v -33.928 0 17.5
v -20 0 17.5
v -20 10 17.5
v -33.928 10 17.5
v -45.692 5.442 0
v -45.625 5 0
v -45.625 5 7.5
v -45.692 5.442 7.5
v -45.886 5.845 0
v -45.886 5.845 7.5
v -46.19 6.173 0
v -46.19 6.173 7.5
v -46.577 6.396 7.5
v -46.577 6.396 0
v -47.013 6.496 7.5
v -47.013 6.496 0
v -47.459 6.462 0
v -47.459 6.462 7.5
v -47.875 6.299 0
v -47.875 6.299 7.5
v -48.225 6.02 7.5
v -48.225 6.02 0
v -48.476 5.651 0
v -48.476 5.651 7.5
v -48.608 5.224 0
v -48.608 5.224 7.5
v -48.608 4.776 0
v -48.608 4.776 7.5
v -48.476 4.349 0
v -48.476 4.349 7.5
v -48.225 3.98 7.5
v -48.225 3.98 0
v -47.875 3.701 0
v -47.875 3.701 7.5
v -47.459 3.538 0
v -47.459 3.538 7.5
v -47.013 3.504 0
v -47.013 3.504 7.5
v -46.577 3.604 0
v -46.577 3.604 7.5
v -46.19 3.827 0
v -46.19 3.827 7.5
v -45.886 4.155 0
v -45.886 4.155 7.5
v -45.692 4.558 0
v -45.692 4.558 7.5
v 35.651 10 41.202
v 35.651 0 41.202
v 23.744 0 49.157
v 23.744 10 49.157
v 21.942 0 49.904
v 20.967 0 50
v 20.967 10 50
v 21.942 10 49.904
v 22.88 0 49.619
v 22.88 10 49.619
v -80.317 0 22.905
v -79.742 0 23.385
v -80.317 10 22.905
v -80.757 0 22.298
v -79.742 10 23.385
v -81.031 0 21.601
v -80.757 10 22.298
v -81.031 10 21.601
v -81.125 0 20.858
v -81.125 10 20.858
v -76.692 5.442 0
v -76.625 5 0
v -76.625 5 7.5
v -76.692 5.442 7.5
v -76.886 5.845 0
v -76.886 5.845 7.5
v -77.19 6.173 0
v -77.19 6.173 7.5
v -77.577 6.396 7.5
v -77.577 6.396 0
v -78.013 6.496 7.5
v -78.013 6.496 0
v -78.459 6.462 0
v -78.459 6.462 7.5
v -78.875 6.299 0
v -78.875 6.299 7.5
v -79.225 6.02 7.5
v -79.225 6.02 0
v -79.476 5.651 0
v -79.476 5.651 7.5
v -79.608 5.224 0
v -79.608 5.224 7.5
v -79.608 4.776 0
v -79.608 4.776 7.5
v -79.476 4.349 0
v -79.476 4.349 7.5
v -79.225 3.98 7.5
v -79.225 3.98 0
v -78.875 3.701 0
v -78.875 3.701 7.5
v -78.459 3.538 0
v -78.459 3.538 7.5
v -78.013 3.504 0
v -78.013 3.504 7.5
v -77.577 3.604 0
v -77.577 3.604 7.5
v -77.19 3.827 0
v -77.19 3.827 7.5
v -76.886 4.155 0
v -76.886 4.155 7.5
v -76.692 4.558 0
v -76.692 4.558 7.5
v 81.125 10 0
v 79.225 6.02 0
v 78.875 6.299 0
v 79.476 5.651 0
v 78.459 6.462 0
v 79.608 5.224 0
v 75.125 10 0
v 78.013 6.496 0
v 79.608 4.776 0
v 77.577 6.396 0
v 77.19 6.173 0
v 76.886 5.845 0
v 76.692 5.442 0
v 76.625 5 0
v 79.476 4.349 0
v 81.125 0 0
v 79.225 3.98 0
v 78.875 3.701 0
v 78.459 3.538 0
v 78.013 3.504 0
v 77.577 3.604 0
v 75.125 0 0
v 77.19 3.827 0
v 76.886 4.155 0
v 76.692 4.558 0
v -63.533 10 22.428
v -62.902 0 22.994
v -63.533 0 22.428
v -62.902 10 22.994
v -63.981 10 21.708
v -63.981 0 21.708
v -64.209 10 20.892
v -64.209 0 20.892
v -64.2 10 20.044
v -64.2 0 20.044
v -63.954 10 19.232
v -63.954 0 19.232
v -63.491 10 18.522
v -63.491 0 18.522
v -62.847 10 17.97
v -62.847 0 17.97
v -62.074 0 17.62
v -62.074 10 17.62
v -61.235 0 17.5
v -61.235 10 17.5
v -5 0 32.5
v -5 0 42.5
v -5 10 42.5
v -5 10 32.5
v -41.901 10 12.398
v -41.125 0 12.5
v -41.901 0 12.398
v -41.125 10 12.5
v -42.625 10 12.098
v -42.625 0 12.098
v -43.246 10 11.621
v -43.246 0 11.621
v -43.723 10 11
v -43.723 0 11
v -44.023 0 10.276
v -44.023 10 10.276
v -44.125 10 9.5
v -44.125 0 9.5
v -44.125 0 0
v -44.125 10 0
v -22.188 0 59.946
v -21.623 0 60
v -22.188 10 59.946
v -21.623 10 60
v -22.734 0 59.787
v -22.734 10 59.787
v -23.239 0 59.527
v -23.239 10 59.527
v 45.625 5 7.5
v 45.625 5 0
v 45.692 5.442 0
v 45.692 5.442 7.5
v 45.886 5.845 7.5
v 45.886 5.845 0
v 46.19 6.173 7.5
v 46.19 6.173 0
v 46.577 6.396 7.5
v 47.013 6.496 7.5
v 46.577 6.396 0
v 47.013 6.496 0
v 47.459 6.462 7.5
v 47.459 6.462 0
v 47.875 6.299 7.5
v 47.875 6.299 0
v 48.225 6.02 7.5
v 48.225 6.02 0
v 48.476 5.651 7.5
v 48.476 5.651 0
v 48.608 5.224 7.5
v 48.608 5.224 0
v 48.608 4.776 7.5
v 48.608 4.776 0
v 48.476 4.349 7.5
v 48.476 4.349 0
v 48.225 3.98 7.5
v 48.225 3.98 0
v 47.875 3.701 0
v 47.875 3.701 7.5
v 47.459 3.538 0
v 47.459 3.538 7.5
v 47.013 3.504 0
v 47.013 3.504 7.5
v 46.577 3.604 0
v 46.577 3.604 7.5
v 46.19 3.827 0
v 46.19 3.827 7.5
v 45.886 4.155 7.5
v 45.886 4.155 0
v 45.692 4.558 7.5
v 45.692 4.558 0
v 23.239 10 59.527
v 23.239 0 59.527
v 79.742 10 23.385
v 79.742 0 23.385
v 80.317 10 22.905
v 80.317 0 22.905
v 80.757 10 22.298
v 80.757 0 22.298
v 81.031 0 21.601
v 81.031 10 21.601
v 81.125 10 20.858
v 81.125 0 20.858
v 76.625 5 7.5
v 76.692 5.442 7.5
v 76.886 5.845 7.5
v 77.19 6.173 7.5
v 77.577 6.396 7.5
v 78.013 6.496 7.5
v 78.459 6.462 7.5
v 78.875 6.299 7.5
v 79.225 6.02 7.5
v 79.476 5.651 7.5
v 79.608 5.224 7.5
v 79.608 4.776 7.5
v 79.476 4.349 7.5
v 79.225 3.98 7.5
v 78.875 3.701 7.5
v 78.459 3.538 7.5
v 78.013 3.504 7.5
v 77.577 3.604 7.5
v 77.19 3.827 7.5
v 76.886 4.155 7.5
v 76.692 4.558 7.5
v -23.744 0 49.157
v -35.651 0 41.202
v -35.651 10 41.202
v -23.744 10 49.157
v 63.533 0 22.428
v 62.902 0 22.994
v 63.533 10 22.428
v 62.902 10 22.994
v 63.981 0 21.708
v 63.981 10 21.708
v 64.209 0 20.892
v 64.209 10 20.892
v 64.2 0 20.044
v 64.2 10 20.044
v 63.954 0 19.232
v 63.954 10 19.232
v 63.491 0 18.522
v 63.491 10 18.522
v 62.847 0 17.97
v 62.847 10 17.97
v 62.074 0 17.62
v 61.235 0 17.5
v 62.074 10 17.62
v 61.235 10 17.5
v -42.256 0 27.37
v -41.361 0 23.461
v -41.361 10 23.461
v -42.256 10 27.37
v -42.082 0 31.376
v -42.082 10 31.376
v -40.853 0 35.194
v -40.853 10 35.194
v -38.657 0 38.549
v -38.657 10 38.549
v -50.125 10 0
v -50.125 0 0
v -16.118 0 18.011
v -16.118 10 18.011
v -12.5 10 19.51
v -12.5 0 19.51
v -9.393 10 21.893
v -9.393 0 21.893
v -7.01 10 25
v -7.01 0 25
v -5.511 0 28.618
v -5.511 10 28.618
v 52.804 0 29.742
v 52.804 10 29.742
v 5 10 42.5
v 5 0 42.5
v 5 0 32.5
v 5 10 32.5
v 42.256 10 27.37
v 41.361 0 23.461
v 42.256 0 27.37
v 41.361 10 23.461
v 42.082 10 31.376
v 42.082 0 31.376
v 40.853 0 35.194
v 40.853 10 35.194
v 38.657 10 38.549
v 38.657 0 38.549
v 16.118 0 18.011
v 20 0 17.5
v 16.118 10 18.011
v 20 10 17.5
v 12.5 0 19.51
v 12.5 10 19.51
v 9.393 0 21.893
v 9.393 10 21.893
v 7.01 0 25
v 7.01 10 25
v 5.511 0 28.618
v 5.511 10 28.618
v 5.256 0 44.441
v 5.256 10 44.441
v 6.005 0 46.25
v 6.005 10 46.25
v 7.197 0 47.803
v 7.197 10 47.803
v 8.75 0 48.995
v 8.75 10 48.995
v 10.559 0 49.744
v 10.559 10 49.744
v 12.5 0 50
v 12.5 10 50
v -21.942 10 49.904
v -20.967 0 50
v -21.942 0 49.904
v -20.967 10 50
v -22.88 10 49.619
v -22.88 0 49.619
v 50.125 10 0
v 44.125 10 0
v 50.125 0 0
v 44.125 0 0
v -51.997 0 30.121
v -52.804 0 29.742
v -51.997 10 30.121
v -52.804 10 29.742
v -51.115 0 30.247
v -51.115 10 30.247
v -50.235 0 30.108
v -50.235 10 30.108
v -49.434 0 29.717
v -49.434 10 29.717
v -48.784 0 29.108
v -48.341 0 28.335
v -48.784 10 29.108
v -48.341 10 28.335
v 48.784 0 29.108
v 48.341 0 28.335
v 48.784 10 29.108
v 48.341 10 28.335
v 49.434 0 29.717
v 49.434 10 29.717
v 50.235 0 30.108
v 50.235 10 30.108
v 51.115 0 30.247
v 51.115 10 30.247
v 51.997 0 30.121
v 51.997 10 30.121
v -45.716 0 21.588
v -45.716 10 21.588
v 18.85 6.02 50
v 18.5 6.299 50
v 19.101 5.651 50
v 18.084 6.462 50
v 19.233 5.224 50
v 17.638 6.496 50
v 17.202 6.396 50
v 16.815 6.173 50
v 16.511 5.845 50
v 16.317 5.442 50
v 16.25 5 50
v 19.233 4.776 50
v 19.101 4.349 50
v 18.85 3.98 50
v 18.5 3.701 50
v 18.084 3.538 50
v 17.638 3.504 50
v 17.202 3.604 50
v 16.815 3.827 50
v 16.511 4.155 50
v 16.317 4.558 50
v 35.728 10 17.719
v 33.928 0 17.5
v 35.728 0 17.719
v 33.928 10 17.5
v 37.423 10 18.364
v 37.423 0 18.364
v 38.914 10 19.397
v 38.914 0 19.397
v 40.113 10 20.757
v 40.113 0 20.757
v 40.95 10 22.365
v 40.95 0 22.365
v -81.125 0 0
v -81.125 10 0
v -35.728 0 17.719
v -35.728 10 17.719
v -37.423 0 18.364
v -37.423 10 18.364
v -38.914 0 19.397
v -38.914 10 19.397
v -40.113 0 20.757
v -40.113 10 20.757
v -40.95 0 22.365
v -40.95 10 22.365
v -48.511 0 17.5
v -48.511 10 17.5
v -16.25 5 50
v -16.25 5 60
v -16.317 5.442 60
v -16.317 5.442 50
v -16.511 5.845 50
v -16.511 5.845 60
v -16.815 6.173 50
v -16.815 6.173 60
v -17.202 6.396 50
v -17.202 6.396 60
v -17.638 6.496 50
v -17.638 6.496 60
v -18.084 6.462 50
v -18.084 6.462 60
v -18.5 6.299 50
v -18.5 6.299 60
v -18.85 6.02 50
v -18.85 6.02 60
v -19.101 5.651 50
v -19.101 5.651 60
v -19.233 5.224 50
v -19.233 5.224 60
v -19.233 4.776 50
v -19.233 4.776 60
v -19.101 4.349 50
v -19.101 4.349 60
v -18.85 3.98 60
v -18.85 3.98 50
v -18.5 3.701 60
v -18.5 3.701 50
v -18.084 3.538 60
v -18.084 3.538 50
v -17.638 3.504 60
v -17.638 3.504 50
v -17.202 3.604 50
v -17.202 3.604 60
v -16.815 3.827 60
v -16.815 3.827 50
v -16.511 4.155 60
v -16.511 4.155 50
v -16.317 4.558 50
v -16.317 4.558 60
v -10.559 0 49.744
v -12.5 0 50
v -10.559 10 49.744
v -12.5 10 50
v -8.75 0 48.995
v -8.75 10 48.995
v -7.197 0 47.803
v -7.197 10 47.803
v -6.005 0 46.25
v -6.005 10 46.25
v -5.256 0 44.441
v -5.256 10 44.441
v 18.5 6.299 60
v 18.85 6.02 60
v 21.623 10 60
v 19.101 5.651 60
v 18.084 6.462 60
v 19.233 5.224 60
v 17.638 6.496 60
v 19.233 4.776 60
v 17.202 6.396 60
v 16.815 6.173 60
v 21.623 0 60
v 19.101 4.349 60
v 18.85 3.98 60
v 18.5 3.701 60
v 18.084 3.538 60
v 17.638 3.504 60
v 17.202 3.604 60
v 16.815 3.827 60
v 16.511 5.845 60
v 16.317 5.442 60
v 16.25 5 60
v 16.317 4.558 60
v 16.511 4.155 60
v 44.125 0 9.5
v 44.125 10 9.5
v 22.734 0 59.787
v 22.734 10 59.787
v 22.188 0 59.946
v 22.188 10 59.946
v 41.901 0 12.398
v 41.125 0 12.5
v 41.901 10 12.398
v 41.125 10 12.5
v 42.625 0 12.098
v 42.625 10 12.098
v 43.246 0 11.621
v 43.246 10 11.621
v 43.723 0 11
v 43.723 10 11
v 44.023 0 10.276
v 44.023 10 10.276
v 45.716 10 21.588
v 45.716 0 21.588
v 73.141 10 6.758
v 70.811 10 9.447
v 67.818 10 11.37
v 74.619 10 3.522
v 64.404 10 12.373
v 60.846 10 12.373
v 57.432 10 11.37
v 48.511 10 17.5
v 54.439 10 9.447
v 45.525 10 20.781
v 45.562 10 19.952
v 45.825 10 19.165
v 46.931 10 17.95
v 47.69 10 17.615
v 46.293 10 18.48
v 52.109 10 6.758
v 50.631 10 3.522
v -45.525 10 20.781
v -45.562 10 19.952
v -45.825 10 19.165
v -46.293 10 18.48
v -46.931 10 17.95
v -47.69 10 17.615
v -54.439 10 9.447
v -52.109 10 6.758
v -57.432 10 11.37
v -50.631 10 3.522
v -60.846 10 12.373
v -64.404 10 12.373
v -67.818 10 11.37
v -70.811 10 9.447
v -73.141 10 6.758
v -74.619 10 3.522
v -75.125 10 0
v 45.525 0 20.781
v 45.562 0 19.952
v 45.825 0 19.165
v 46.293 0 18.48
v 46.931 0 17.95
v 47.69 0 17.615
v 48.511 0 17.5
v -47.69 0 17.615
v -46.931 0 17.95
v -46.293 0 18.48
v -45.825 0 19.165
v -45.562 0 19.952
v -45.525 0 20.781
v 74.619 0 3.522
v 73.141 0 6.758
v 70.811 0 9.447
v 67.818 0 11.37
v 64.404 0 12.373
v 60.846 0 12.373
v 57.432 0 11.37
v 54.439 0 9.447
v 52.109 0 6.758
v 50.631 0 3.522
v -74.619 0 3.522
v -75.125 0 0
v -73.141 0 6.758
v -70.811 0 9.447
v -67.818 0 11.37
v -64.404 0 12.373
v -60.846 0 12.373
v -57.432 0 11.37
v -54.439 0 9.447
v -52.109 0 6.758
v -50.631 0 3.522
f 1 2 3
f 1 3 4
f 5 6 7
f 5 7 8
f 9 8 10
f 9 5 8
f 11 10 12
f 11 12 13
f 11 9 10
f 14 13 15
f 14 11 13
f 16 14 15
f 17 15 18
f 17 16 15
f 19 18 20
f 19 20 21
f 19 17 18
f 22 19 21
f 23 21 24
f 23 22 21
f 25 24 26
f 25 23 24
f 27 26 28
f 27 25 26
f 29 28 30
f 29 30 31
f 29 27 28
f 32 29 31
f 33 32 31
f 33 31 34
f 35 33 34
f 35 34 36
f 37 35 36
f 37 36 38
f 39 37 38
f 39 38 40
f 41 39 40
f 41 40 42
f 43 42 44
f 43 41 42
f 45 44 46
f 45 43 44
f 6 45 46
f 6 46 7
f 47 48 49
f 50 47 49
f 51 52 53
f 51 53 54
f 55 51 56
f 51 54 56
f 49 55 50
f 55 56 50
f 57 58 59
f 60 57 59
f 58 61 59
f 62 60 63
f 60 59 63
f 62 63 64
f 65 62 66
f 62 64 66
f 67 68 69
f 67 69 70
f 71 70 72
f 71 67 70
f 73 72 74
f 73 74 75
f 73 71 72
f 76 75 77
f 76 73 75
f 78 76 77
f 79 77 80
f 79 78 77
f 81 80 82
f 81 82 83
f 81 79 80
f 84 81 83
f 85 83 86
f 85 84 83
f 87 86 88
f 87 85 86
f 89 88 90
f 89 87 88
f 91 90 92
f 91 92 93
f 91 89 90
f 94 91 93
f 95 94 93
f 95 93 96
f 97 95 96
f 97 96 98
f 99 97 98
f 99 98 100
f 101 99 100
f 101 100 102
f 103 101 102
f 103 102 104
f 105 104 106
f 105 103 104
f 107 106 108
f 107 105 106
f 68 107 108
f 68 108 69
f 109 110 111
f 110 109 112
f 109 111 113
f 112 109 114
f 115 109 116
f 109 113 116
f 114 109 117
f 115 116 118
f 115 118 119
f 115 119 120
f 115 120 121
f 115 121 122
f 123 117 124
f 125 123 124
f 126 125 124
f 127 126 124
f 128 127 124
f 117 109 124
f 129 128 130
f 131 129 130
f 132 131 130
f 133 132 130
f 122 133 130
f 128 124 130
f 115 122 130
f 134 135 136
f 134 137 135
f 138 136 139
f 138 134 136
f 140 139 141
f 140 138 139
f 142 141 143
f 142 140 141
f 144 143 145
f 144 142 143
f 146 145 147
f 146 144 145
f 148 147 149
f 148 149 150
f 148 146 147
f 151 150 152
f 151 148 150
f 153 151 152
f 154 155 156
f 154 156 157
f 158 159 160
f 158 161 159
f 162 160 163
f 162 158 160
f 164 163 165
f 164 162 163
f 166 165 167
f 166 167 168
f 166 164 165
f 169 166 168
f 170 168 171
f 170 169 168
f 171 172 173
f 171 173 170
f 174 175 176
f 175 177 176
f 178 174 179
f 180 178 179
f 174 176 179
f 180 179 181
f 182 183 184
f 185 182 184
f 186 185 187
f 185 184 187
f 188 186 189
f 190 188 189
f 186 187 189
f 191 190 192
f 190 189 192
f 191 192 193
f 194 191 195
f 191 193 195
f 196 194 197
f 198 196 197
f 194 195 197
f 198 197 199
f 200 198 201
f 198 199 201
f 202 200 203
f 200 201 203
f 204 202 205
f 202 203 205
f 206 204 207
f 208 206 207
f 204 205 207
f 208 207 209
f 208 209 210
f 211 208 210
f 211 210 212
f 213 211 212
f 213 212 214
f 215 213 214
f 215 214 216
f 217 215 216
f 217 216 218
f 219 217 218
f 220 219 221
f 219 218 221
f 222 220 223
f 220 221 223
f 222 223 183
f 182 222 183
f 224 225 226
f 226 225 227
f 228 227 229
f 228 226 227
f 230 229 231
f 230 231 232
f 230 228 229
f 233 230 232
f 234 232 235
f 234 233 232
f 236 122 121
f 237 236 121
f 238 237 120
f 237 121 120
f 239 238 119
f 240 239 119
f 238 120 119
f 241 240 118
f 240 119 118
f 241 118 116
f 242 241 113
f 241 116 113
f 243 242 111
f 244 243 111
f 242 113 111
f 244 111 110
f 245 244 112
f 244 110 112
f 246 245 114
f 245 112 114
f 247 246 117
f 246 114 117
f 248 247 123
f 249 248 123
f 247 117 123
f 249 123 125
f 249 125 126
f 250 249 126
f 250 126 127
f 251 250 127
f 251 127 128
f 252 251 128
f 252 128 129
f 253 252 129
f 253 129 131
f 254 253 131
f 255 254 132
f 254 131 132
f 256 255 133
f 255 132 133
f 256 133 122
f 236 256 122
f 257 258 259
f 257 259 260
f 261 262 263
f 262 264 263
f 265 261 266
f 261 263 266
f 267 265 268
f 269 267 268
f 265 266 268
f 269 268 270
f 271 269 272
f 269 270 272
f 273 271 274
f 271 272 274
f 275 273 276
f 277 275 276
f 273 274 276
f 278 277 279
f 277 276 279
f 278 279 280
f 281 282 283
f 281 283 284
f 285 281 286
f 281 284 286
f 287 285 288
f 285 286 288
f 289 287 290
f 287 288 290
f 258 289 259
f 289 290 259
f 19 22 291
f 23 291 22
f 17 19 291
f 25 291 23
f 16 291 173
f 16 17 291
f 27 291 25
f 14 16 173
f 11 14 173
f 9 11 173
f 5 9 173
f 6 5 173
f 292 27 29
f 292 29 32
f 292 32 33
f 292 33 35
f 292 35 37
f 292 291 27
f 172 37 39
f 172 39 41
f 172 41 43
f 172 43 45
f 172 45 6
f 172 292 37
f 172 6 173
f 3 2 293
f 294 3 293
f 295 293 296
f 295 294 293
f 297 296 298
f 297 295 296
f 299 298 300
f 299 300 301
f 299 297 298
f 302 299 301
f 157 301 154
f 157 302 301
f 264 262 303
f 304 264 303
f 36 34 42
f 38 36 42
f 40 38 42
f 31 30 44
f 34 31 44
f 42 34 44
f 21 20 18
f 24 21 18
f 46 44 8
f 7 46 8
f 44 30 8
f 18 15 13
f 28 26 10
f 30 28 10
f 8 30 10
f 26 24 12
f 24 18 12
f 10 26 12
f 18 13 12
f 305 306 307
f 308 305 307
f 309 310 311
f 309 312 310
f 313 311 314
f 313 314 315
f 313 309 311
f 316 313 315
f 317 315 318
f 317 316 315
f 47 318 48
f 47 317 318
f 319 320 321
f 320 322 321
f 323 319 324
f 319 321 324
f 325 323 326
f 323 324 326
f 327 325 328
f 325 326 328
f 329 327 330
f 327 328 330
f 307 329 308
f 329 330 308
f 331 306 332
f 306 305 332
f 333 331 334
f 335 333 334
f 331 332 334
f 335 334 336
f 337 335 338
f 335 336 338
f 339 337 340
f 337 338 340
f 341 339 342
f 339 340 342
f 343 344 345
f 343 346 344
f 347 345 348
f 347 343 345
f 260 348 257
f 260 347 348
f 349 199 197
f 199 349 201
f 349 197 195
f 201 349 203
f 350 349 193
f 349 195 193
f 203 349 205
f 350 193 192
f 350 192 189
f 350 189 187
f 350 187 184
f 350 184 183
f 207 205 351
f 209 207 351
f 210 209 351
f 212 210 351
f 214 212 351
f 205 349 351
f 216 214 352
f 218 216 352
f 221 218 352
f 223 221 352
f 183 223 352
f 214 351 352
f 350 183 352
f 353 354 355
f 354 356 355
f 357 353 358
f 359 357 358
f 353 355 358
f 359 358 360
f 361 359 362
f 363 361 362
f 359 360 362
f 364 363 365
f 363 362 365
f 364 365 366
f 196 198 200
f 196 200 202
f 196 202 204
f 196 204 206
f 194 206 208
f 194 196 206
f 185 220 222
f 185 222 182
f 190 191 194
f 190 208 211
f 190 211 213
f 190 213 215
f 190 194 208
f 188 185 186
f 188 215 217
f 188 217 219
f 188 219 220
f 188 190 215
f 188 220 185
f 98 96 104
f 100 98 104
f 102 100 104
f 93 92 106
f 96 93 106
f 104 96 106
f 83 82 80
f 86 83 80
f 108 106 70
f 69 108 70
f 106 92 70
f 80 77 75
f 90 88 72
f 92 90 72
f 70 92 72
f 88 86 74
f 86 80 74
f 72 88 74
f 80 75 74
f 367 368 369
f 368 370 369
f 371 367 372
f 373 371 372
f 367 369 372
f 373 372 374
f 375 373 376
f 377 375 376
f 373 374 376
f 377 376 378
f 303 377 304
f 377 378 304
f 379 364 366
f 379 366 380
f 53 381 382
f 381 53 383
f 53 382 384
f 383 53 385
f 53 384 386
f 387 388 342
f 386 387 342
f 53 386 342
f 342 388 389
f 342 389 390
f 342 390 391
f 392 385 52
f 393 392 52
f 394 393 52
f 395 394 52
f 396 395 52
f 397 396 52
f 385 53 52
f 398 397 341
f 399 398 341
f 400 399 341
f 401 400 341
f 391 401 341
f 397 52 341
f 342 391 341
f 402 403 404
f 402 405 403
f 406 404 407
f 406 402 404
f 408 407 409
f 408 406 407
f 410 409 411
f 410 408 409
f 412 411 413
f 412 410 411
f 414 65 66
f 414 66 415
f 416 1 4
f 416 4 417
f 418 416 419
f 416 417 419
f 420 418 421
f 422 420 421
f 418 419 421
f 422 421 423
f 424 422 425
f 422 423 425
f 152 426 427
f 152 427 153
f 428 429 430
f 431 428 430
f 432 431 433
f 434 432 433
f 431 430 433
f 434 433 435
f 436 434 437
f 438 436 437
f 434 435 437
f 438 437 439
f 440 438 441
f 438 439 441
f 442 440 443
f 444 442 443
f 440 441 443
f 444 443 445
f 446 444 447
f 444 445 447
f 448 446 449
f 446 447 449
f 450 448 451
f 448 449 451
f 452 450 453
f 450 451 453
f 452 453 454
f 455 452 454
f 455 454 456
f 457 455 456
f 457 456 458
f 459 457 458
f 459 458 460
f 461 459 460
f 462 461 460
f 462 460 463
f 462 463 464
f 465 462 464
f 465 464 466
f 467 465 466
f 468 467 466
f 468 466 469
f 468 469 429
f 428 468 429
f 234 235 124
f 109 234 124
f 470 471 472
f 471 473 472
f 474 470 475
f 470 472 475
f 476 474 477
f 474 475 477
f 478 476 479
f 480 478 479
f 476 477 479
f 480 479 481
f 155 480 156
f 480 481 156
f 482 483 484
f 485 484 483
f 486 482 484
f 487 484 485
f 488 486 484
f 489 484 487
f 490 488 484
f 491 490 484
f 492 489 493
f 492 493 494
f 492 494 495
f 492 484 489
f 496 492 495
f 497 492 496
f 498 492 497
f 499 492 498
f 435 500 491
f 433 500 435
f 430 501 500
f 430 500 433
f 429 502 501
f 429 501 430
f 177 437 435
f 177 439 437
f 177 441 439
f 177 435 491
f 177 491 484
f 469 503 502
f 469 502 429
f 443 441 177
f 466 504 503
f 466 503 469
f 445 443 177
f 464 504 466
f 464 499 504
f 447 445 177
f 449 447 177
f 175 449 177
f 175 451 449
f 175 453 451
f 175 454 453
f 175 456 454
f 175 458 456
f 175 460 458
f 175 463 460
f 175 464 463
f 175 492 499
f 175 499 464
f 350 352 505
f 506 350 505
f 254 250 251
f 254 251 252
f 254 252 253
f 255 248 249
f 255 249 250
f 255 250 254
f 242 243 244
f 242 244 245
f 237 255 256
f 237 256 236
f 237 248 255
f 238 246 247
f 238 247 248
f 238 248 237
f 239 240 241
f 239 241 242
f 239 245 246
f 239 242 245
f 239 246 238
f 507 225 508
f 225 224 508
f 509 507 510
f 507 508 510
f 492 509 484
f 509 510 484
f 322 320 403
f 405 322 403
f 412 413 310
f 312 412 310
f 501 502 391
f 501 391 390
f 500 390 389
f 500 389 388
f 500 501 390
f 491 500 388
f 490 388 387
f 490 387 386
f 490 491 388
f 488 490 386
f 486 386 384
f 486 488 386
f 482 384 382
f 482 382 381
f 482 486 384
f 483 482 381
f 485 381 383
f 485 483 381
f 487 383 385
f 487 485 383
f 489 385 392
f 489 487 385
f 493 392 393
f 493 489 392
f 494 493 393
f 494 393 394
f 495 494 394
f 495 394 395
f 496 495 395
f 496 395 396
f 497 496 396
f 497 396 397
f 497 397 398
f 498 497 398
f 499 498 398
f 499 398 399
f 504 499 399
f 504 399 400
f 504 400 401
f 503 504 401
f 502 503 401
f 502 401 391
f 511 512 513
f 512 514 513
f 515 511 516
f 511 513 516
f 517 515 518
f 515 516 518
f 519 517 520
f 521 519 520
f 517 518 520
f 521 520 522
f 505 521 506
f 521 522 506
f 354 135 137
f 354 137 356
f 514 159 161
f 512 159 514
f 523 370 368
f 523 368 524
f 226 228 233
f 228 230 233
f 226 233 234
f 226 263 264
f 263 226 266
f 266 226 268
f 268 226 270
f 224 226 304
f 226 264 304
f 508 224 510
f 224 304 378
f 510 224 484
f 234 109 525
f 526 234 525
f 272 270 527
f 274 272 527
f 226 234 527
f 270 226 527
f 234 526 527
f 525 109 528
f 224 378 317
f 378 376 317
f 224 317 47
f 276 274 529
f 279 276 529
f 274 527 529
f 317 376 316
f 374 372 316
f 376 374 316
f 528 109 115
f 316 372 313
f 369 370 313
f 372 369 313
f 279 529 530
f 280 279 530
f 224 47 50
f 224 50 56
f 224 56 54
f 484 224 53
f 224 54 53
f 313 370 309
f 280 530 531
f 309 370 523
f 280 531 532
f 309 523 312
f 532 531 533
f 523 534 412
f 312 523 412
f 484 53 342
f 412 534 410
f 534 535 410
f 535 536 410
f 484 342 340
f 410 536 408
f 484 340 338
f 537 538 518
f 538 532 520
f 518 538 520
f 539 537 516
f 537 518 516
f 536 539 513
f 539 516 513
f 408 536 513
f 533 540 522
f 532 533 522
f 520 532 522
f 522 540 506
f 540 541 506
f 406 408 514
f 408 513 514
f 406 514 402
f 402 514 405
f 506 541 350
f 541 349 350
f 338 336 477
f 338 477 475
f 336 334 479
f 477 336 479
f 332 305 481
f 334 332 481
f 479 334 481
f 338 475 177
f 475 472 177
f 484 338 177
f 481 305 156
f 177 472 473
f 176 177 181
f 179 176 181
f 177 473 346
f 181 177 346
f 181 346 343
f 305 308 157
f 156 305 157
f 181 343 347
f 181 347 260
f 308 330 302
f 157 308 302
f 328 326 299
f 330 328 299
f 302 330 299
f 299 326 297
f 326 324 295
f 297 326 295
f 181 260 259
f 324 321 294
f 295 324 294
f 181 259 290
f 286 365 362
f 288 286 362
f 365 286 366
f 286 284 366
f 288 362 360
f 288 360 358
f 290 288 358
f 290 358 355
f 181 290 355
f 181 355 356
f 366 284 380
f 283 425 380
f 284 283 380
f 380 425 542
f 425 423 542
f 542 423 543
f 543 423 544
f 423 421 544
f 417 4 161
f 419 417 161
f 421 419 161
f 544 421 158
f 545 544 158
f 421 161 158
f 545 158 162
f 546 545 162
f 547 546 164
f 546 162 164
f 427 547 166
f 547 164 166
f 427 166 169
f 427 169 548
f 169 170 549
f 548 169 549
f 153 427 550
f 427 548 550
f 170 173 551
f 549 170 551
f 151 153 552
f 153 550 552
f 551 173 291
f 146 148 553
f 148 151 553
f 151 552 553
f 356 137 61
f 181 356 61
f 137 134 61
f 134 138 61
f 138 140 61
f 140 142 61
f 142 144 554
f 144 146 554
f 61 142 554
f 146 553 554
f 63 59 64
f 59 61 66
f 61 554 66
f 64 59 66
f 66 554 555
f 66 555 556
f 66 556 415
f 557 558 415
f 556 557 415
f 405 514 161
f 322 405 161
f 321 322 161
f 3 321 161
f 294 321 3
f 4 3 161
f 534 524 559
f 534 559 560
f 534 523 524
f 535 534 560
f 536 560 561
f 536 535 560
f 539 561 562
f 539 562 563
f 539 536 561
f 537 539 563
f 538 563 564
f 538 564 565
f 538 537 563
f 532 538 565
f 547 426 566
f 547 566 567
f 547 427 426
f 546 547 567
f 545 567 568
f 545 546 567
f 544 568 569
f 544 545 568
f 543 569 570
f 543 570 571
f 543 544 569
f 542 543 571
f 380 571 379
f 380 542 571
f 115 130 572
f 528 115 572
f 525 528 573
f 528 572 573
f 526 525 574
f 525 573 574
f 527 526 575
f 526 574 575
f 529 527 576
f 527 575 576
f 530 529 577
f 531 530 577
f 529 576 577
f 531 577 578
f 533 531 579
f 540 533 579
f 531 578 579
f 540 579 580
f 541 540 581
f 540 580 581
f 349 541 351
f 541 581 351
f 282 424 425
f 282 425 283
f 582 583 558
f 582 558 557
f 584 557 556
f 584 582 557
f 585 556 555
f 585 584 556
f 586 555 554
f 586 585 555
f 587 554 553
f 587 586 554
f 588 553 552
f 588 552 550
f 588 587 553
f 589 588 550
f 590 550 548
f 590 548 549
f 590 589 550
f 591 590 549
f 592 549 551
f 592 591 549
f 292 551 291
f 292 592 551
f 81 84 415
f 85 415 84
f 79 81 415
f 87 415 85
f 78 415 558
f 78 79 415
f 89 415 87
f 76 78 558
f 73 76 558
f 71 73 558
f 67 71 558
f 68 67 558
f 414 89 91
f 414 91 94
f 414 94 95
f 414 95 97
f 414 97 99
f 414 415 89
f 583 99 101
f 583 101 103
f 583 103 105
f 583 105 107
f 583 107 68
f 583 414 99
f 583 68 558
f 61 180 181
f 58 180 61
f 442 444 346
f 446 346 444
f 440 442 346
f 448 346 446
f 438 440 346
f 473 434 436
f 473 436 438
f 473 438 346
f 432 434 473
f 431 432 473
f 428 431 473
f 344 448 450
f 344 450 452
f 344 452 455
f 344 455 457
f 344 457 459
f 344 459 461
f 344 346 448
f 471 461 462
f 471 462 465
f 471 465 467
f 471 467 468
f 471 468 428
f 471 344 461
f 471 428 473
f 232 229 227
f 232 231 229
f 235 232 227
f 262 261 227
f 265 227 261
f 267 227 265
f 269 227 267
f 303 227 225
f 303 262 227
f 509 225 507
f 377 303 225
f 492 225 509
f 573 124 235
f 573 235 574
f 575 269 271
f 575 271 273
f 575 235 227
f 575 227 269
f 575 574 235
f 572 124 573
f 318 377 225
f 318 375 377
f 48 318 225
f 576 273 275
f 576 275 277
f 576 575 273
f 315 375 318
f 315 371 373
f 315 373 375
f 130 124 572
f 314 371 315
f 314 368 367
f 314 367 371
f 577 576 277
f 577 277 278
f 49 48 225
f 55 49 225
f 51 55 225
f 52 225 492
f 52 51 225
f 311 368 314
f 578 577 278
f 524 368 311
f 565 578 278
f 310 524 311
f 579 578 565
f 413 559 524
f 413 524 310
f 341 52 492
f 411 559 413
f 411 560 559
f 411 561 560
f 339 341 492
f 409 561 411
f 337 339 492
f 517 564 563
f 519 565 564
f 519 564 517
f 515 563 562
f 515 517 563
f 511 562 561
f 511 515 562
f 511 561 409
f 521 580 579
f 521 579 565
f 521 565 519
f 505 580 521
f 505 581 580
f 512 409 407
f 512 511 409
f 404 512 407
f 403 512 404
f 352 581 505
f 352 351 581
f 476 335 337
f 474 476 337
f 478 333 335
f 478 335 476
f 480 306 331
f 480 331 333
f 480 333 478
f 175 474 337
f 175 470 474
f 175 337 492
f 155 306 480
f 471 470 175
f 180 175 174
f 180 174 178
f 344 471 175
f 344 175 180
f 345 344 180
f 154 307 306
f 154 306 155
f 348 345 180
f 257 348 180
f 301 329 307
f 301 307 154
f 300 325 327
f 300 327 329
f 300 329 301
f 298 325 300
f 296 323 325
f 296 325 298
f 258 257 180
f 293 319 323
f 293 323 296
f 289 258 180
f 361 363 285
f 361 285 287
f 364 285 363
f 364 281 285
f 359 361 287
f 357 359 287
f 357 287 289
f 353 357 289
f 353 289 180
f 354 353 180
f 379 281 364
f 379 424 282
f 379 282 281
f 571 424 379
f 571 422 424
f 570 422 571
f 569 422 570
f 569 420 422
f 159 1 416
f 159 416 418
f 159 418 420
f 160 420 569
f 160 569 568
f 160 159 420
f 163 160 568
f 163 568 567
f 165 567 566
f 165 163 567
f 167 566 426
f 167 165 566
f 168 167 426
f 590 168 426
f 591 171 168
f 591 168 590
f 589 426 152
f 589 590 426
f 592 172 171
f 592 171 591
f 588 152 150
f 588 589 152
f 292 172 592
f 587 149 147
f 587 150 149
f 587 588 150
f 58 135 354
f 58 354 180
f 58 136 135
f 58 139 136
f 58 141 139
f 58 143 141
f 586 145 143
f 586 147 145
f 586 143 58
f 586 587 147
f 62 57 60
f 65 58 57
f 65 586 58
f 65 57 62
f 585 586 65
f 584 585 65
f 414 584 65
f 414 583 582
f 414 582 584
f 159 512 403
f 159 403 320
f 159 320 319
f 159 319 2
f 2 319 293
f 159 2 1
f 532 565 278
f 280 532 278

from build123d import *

# Parameters (mm, degrees)
BOSS_EXTRUDE1_DEPTH = 10
CUT_EXTRUDE5_REACH  = 103.397
SKETCH9_R           = 1.5
FILLET10_R          = 3
FILLET11_R          = 3
FILLET12_R          = 3
FILLET13_R          = 7.5
FILLET14_R          = 15
FILLET16_R          = 15
FILLET18_R          = 15
FILLET19_R          = 7.5
FILLET22_R          = 3
FILLET23_R          = 3
FILLET24_R          = 15
FILLET25_R          = 3
FILLET26_R          = 3
FILLET27_R          = 3
FILLET28_R          = 3
FILLET29_R          = 3
FILLET30_R          = 3
FILLET31_R          = 3
SKETCH11_R          = 1.5
CUT_EXTRUDE6_DEPTH  = 7.5
FILLET32_R          = 7.5
FILLET33_R          = 5
FILLET34_R          = 7.5
FILLET36_R          = 5


with BuildPart() as part:
    # Sketch1 → Boss-Extrude1 (new body)
    with BuildSketch(Plane(origin=(0, 0, 0), x_dir=(1, 0, 0), z_dir=(0, 1, 0))):
        with BuildLine():
            Line((0, -12.5), (0, -60))
            Line((0, -60), (22.5, -60))
            Line((22.5, -60), (81.125, -22.5))
            Line((81.125, -22.5), (81.125, 0))
            Line((81.125, 0), (75.125, 0))
            ThreePointArc((75.125, 0), (62.625, -12.5), (50.125, 0))
            Line((50.125, 0), (44.125, 0))
            Line((44.125, 0), (44.125, -12.5))
            Line((44.125, -12.5), (0, -12.5))
        make_face()
        Polygon((39.125, -17.5), (45.538841531, -34.595428821), (22.483333333, -50), (5, -50), (5, -17.5), align=None, mode=Mode.SUBTRACT)
        Polygon((71.125, -17.5), (49.69624181, -31.817655806), (44.125, -17.5), align=None, mode=Mode.SUBTRACT)
    boss_extrude1 = extrude(amount=BOSS_EXTRUDE1_DEPTH)

    # Mirror1: Boss-Extrude1 across plane
    add(boss_extrude1.mirror(Plane(origin=(0, 10, 0), x_dir=(0, 0, 1), z_dir=(-1, 0, 0))))

    # Sketch9 → Cut-Extrude5 (cut, up to next)
    with BuildSketch(Plane.XY.offset(60), mode=Mode.PRIVATE) as cut_extrude5_sk1:
        with Locations((-17.75, 5)):
            Circle(SKETCH9_R)
    cut_extrude5_tool1 = extrude(cut_extrude5_sk1.sketch, amount=-CUT_EXTRUDE5_REACH, mode=Mode.PRIVATE) & part.part
    cut_extrude5 = cut_extrude5_tool1.solids().sort_by_distance((-17.75, 5, 60))[0]
    add(cut_extrude5, mode=Mode.SUBTRACT)

    # Mirror2: Cut-Extrude5 across plane
    add(cut_extrude5.mirror(Plane(origin=(0, 0, 0), x_dir=(0, 0, 1), z_dir=(1, 0, 0))), mode=Mode.SUBTRACT)

    # Fillet10
    fillet10_edges = [part.edges().sort_by_distance(p)[0] for p in [
        (71.125, 5, 17.5),
    ]]
    fillet(fillet10_edges, radius=FILLET10_R)

    # Fillet11
    fillet11_edges = [part.edges().sort_by_distance(p)[0] for p in [
        (44.125, 5, 17.5),
    ]]
    fillet(fillet11_edges, radius=FILLET11_R)

    # Fillet12
    fillet12_edges = [part.edges().sort_by_distance(p)[0] for p in [
        (49.69624181, 5, 31.817655806),
    ]]
    fillet(fillet12_edges, radius=FILLET12_R)

    # Fillet13
    fillet13_edges = [part.edges().sort_by_distance(p)[0] for p in [
        (39.125, 5, 17.5),
    ]]
    fillet(fillet13_edges, radius=FILLET13_R)

    # Fillet14
    fillet14_edges = [part.edges().sort_by_distance(p)[0] for p in [
        (45.538841531, 5, 34.595428821),
    ]]
    fillet(fillet14_edges, radius=FILLET14_R)

    # Fillet16
    fillet16_edges = [part.edges().sort_by_distance(p)[0] for p in [
        (5, 5, 17.5),
    ]]
    fillet(fillet16_edges, radius=FILLET16_R)

    # Fillet18
    fillet18_edges = [part.edges().sort_by_distance(p)[0] for p in [
        (-5, 5, 17.5),
    ]]
    fillet(fillet18_edges, radius=FILLET18_R)

    # Fillet19
    fillet19_edges = [part.edges().sort_by_distance(p)[0] for p in [
        (-39.125, 5, 17.5),
    ]]
    fillet(fillet19_edges, radius=FILLET19_R)

    # Fillet22
    fillet22_edges = [part.edges().sort_by_distance(p)[0] for p in [
        (44.125, 5, 12.5),
    ]]
    fillet(fillet22_edges, radius=FILLET22_R)

    # Fillet23
    fillet23_edges = [part.edges().sort_by_distance(p)[0] for p in [
        (-44.125, 5, 12.5),
    ]]
    fillet(fillet23_edges, radius=FILLET23_R)

    # Fillet24
    fillet24_edges = [part.edges().sort_by_distance(p)[0] for p in [
        (-45.538841531, 5, 34.595428821),
    ]]
    fillet(fillet24_edges, radius=FILLET24_R)

    # Fillet25
    fillet25_edges = [part.edges().sort_by_distance(p)[0] for p in [
        (-44.125, 5, 17.5),
    ]]
    fillet(fillet25_edges, radius=FILLET25_R)

    # Fillet26
    fillet26_edges = [part.edges().sort_by_distance(p)[0] for p in [
        (-49.69624181, 5, 31.817655806),
    ]]
    fillet(fillet26_edges, radius=FILLET26_R)

    # Fillet27
    fillet27_edges = [part.edges().sort_by_distance(p)[0] for p in [
        (-71.125, 5, 17.5),
    ]]
    fillet(fillet27_edges, radius=FILLET27_R)

    # Fillet28
    fillet28_edges = [part.edges().sort_by_distance(p)[0] for p in [
        (22.5, 5, 60),
    ]]
    fillet(fillet28_edges, radius=FILLET28_R)

    # Fillet29
    fillet29_edges = [part.edges().sort_by_distance(p)[0] for p in [
        (-22.5, 5, 60),
    ]]
    fillet(fillet29_edges, radius=FILLET29_R)

    # Fillet30
    fillet30_edges = [part.edges().sort_by_distance(p)[0] for p in [
        (81.125, 5, 22.5),
    ]]
    fillet(fillet30_edges, radius=FILLET30_R)

    # Fillet31
    fillet31_edges = [part.edges().sort_by_distance(p)[0] for p in [
        (-81.125, 5, 22.5),
    ]]
    fillet(fillet31_edges, radius=FILLET31_R)

    # Sketch11 → Cut-Extrude6 (cut)
    with BuildSketch(Plane(origin=(0, 0, 0), x_dir=(-1, 0, 0), z_dir=(0, 0, -1))):
        with Locations((-78.125, 5)):
            Circle(SKETCH11_R)
        with Locations((-47.125, 5)):
            Circle(SKETCH11_R)
    cut_extrude6 = extrude(amount=-CUT_EXTRUDE6_DEPTH, mode=Mode.SUBTRACT)

    # Mirror3: Cut-Extrude6 across plane
    add(cut_extrude6.mirror(Plane(origin=(0, 0, 0), x_dir=(0, 0, 1), z_dir=(1, 0, 0))), mode=Mode.SUBTRACT)

    # Fillet32
    fillet32_edges = [part.edges().sort_by_distance(p)[0] for p in [
        (5, 5, 50),
    ]]
    fillet(fillet32_edges, radius=FILLET32_R)

    # Fillet33
    fillet33_edges = [part.edges().sort_by_distance(p)[0] for p in [
        (22.483333333, 5, 50),
    ]]
    fillet(fillet33_edges, radius=FILLET33_R)

    # Fillet34
    fillet34_edges = [part.edges().sort_by_distance(p)[0] for p in [
        (-5, 5, 50),
    ]]
    fillet(fillet34_edges, radius=FILLET34_R)

    # Fillet36
    fillet36_edges = [part.edges().sort_by_distance(p)[0] for p in [
        (-22.483333333, 5, 50),
    ]]
    fillet(fillet36_edges, radius=FILLET36_R)


solid = part.part
